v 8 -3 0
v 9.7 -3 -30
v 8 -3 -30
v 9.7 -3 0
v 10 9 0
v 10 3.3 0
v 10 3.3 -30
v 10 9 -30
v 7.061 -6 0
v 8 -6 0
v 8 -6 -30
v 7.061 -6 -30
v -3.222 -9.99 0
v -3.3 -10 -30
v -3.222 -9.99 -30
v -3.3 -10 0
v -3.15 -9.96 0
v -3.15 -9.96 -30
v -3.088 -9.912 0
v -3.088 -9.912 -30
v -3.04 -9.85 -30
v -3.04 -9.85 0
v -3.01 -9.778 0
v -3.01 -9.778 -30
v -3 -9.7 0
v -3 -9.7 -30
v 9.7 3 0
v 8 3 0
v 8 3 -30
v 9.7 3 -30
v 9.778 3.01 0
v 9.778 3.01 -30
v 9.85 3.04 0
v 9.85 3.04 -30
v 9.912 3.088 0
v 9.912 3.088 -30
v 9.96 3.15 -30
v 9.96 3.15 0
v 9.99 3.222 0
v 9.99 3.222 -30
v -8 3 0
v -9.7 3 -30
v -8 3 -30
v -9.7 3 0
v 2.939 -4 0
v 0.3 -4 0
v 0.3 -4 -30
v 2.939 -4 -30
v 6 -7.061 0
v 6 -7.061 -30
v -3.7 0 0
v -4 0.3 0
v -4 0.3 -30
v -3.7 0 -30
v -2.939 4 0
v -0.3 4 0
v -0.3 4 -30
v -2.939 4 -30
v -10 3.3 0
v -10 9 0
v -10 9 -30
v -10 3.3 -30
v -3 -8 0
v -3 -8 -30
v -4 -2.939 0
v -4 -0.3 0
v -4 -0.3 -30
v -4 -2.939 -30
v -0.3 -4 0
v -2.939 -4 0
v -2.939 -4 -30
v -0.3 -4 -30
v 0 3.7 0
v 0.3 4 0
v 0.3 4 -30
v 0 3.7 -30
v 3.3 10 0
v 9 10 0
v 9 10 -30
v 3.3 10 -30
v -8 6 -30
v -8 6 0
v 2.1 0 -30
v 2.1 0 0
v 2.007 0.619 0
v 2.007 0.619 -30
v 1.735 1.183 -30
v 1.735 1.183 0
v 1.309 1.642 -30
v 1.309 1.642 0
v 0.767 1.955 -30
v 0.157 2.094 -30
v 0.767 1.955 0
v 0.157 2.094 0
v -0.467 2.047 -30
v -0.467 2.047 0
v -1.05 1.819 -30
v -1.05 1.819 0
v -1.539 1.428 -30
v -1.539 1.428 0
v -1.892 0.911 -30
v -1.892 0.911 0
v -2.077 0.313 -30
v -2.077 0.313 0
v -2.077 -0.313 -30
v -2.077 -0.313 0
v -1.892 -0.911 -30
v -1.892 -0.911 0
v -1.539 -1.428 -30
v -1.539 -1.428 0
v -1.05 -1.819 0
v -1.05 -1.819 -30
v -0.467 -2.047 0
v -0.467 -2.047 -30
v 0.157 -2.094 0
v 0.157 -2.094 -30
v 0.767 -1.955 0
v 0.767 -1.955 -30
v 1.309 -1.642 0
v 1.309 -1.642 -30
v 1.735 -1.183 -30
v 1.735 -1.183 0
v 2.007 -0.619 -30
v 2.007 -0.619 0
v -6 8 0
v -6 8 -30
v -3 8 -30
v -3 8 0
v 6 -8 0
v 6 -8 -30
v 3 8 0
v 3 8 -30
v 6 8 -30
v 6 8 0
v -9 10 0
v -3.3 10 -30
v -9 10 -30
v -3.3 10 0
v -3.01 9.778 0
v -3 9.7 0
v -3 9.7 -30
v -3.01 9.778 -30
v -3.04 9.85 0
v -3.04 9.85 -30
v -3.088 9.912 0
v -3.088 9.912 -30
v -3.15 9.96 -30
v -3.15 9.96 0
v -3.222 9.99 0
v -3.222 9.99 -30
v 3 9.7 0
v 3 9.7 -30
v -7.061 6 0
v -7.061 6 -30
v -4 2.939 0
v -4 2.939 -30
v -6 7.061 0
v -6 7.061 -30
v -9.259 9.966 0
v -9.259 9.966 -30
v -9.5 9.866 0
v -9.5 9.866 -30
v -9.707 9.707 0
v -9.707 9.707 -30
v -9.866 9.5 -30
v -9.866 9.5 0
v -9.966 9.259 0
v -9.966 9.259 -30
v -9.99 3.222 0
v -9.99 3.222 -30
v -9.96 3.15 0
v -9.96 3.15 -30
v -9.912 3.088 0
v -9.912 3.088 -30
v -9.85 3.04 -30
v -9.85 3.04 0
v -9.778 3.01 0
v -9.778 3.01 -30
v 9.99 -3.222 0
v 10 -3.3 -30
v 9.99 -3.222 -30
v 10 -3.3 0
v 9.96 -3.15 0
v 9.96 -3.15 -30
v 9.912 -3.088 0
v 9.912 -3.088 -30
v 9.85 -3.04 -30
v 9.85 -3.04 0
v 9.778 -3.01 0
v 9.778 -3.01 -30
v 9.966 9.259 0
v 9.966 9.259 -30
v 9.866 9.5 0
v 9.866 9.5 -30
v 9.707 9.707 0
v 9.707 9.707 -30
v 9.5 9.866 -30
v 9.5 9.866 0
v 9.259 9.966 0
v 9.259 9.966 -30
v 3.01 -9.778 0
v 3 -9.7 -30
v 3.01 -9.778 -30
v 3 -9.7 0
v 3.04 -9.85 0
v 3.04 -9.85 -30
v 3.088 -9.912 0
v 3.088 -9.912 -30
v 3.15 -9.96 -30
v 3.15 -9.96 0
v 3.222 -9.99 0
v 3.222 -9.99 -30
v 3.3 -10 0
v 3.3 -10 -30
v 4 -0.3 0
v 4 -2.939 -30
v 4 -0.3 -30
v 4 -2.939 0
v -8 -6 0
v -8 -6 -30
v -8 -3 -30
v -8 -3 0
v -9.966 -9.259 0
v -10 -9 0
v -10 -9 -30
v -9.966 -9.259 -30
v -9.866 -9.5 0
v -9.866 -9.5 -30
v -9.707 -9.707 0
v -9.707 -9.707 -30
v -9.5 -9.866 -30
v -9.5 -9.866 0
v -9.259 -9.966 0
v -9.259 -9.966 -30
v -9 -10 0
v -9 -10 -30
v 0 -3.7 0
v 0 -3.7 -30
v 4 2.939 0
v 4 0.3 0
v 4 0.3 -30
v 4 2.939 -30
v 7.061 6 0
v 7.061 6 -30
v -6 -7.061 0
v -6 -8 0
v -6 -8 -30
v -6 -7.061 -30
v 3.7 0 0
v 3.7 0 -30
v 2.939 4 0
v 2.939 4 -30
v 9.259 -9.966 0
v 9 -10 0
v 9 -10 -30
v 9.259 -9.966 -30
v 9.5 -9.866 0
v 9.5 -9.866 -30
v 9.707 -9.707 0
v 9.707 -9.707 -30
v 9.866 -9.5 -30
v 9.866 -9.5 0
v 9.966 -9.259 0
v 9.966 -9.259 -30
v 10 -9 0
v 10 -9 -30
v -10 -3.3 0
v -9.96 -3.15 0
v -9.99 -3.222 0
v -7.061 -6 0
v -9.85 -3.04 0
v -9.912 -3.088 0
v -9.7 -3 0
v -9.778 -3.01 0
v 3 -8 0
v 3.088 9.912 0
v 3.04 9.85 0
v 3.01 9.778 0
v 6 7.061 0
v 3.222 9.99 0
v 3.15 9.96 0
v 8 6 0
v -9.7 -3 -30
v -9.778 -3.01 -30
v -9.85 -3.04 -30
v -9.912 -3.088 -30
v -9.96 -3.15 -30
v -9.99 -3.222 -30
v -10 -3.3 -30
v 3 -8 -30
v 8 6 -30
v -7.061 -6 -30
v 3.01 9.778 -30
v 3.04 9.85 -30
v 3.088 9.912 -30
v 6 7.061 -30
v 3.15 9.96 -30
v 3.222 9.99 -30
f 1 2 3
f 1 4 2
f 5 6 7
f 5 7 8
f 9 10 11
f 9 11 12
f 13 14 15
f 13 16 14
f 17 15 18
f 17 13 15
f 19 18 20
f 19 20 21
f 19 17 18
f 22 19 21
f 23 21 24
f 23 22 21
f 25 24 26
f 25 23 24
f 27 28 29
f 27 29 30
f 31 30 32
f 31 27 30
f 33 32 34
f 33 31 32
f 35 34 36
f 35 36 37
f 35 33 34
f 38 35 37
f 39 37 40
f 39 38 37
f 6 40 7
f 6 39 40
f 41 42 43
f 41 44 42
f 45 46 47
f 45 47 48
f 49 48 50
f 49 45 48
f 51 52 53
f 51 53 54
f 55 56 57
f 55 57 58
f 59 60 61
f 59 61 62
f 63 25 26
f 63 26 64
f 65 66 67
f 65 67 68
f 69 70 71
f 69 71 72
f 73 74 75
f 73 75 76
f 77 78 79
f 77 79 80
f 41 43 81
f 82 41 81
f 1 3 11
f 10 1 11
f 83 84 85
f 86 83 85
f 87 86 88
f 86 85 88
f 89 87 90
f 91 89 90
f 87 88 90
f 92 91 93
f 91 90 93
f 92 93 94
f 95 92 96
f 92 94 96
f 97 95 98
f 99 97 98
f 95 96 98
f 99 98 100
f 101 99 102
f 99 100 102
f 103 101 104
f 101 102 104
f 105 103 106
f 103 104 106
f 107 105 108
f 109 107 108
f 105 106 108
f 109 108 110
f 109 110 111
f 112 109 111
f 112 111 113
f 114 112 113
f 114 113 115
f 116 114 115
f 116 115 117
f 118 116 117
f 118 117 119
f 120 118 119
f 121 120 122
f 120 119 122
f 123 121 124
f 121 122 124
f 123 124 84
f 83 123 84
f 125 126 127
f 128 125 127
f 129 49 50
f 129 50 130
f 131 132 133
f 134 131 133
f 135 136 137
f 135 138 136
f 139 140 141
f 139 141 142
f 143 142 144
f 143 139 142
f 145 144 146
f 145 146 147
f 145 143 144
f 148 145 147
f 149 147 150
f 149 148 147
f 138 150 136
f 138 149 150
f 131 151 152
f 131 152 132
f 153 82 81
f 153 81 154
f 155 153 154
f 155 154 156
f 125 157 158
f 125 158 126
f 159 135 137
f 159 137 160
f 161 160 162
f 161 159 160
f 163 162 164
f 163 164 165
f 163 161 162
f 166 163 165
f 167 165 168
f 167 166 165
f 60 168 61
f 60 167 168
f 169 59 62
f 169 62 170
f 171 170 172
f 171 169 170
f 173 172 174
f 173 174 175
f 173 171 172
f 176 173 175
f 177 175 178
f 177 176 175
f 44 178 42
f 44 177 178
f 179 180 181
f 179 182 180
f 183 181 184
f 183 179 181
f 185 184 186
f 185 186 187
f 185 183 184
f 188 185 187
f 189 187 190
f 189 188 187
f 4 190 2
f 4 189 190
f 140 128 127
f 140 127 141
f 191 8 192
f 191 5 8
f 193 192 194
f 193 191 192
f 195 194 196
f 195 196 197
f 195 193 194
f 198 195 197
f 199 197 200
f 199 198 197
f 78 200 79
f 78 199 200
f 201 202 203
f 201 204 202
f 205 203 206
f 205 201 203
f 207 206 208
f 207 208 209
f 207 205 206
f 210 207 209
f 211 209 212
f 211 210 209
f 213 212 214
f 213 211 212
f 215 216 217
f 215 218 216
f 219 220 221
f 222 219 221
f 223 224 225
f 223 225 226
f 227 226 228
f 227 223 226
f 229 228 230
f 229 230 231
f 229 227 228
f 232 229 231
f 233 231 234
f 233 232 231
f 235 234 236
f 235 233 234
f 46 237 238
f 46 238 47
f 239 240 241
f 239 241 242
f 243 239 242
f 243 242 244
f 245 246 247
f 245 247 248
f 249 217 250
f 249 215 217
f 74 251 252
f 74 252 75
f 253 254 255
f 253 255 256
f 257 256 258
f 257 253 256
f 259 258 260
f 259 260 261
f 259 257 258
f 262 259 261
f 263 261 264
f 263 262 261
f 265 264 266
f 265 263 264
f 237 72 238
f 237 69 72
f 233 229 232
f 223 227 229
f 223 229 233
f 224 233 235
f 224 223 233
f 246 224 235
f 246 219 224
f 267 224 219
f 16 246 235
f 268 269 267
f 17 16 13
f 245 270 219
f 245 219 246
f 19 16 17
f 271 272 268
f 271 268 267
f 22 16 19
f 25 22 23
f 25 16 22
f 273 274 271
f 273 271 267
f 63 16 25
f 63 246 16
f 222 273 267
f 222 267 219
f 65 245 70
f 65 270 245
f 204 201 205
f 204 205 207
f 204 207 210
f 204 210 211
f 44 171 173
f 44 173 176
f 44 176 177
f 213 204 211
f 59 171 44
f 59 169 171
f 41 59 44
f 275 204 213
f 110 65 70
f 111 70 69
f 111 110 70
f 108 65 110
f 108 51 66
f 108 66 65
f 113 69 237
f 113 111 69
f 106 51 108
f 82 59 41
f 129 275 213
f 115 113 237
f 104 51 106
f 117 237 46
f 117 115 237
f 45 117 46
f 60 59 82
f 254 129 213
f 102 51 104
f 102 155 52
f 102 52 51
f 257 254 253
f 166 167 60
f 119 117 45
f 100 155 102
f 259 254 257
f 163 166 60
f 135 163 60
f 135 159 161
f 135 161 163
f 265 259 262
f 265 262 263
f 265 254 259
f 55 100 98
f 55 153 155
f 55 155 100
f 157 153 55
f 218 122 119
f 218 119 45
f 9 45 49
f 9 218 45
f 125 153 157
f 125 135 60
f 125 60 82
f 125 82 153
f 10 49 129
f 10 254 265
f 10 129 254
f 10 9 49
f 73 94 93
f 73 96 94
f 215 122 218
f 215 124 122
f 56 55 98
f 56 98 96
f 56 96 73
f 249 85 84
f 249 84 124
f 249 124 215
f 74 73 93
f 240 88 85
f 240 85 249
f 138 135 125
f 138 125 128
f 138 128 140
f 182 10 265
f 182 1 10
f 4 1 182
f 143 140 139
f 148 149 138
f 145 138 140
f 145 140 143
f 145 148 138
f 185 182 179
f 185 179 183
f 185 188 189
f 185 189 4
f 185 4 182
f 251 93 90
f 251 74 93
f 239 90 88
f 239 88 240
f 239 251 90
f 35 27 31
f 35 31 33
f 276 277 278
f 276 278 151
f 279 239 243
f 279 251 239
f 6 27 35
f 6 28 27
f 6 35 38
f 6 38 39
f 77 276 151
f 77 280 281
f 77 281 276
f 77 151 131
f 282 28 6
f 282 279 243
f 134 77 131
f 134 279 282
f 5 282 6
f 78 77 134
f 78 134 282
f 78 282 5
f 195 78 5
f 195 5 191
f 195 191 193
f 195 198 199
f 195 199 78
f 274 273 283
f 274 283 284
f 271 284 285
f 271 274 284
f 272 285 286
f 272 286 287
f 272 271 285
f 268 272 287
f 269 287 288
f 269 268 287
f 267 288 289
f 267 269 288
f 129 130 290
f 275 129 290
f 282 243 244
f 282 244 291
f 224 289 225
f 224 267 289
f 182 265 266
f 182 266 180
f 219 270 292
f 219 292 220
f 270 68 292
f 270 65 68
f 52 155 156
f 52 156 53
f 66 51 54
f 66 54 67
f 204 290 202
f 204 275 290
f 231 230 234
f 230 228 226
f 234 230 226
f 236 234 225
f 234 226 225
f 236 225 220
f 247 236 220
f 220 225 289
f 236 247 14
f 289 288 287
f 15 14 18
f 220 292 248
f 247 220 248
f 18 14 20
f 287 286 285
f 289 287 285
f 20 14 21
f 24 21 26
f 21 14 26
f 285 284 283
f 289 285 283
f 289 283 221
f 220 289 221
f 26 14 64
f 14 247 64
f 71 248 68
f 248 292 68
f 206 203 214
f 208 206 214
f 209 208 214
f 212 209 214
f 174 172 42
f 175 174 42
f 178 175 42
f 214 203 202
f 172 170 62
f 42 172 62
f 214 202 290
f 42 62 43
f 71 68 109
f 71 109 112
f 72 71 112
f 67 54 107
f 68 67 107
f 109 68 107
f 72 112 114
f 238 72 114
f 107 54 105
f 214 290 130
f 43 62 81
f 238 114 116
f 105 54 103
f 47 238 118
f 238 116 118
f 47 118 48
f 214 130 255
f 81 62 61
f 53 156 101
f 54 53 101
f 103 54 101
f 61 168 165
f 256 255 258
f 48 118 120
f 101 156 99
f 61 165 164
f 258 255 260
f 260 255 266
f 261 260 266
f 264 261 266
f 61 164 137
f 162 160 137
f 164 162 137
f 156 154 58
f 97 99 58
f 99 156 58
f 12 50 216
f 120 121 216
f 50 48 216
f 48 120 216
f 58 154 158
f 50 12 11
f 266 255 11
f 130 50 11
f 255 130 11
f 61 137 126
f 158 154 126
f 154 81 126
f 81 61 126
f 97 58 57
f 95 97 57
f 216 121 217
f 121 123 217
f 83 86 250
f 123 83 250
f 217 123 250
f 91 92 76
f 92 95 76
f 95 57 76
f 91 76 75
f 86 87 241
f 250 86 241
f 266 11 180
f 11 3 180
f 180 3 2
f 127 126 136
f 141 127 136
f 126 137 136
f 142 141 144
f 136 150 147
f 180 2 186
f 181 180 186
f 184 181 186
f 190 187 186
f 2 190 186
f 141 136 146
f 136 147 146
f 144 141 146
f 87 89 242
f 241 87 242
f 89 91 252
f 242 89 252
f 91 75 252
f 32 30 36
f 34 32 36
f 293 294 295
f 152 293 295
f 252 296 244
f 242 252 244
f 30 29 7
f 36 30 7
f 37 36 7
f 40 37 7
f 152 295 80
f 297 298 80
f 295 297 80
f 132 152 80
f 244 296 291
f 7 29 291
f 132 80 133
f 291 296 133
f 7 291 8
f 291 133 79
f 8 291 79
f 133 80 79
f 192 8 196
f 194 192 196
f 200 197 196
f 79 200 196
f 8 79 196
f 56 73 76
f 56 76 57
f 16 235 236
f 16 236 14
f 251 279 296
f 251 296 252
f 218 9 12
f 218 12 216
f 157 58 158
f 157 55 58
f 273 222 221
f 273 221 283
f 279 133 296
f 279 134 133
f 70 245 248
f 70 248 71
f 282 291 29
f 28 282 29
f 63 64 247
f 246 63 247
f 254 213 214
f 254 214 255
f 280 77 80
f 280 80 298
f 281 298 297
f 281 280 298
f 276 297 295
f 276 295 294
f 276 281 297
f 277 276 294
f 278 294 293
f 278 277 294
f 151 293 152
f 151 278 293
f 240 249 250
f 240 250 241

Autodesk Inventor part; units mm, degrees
sketch "Sketch_5" plane through (0, 0, 0) normal (0, 0, 1) x (1, 0, 0)
  arc A0 (-10, 3.3) -> (-9.7, 3) centre (-9.7, 3.3) ccw
  line L0 (-9.7, 3) -> (-8, 3)
  line L1 (-8, 3) -> (-8, 6)
  line L2 (-8, 6) -> (-7.0607, 6)
  line L3 (-7.0607, 6) -> (-4, 2.9393)
  line L4 (-4, 2.9393) -> (-4, 0.3)
  line L5 (-4, 0.3) -> (-3.7, 0)
  line L6 (-3.7, 0) -> (-4, -0.3)
  line L7 (-4, -0.3) -> (-4, -2.9393)
  line L8 (-4, -2.9393) -> (-7.0607, -6)
  line L9 (-7.0607, -6) -> (-8, -6)
  line L10 (-8, -6) -> (-8, -3)
  line L11 (-8, -3) -> (-9.7, -3)
  arc A1 (-9.7, -3) -> (-10, -3.3) centre (-9.7, -3.3) ccw
  line L12 (-10, -3.3) -> (-10, -9)
  arc A2 (-10, -9) -> (-9, -10) centre (-9, -9) ccw
  line L13 (-9, -10) -> (-3.3, -10)
  arc A3 (-3.3, -10) -> (-3, -9.7) centre (-3.3, -9.7) ccw
  line L14 (-3, -9.7) -> (-3, -8)
  line L15 (-3, -8) -> (-6, -8)
  line L16 (-6, -8) -> (-6, -7.0607)
  line L17 (-6, -7.0607) -> (-2.9393, -4)
  line L18 (-2.9393, -4) -> (-0.3, -4)
  line L19 (-0.3, -4) -> (0, -3.7)
  line L20 (0, -3.7) -> (0.3, -4)
  line L21 (0.3, -4) -> (2.9393, -4)
  line L22 (2.9393, -4) -> (6, -7.0607)
  line L23 (6, -7.0607) -> (6, -8)
  line L24 (6, -8) -> (3, -8)
  line L25 (3, -8) -> (3, -9.7)
  arc A4 (3, -9.7) -> (3.3, -10) centre (3.3, -9.7) ccw
  line L26 (3.3, -10) -> (9, -10)
  arc A5 (9, -10) -> (10, -9) centre (9, -9) ccw
  line L27 (10, -9) -> (10, -3.3)
  arc A6 (10, -3.3) -> (9.7, -3) centre (9.7, -3.3) ccw
  line L28 (9.7, -3) -> (8, -3)
  line L29 (8, -3) -> (8, -6)
  line L30 (8, -6) -> (7.0607, -6)
  line L31 (7.0607, -6) -> (4, -2.9393)
  line L32 (4, -2.9393) -> (4, -0.3)
  line L33 (4, -0.3) -> (3.7, 0)
  line L34 (3.7, 0) -> (4, 0.3)
  line L35 (4, 0.3) -> (4, 2.9393)
  line L36 (4, 2.9393) -> (7.0607, 6)
  line L37 (7.0607, 6) -> (8, 6)
  line L38 (8, 6) -> (8, 3)
  line L39 (8, 3) -> (9.7, 3)
  arc A7 (9.7, 3) -> (10, 3.3) centre (9.7, 3.3) ccw
  line L40 (10, 3.3) -> (10, 9)
  arc A8 (10, 9) -> (9, 10) centre (9, 9) ccw
  line L41 (9, 10) -> (3.3, 10)
  arc A9 (3.3, 10) -> (3, 9.7) centre (3.3, 9.7) ccw
  line L42 (3, 9.7) -> (3, 8)
  line L43 (3, 8) -> (6, 8)
  line L44 (6, 8) -> (6, 7.0607)
  line L45 (6, 7.0607) -> (2.9393, 4)
  line L46 (2.9393, 4) -> (0.3, 4)
  line L47 (0.3, 4) -> (0, 3.7)
  line L48 (0, 3.7) -> (-0.3, 4)
  line L49 (-0.3, 4) -> (-2.9393, 4)
  line L50 (-2.9393, 4) -> (-6, 7.0607)
  line L51 (-6, 7.0607) -> (-6, 8)
  line L52 (-6, 8) -> (-3, 8)
  line L53 (-3, 8) -> (-3, 9.7)
  arc A10 (-3, 9.7) -> (-3.3, 10) centre (-3.3, 9.7) ccw
  line L54 (-3.3, 10) -> (-9, 10)
  arc A11 (-9, 10) -> (-10, 9) centre (-9, 9) ccw
  line L55 (-10, 9) -> (-10, 3.3)
  circle A12 centre (0, 0) radius 2.1
extrude "Extrusion1" add sketch "Sketch_5" against normal blind 30
ref_plane "to_frame_XY" through (0, 0, 0) normal (0, 0, 1) x (1, 0, 0)
ref_plane "to_frame_YZ" through (0, 0, 0) normal (1, 0, 0) x (0, 1, 0)
ref_plane "to_frame_ZX" through (0, 0, 0) normal (0, 1, 0) x (0, 0, 1)
properties part number "KHFS5-2020-1000"
